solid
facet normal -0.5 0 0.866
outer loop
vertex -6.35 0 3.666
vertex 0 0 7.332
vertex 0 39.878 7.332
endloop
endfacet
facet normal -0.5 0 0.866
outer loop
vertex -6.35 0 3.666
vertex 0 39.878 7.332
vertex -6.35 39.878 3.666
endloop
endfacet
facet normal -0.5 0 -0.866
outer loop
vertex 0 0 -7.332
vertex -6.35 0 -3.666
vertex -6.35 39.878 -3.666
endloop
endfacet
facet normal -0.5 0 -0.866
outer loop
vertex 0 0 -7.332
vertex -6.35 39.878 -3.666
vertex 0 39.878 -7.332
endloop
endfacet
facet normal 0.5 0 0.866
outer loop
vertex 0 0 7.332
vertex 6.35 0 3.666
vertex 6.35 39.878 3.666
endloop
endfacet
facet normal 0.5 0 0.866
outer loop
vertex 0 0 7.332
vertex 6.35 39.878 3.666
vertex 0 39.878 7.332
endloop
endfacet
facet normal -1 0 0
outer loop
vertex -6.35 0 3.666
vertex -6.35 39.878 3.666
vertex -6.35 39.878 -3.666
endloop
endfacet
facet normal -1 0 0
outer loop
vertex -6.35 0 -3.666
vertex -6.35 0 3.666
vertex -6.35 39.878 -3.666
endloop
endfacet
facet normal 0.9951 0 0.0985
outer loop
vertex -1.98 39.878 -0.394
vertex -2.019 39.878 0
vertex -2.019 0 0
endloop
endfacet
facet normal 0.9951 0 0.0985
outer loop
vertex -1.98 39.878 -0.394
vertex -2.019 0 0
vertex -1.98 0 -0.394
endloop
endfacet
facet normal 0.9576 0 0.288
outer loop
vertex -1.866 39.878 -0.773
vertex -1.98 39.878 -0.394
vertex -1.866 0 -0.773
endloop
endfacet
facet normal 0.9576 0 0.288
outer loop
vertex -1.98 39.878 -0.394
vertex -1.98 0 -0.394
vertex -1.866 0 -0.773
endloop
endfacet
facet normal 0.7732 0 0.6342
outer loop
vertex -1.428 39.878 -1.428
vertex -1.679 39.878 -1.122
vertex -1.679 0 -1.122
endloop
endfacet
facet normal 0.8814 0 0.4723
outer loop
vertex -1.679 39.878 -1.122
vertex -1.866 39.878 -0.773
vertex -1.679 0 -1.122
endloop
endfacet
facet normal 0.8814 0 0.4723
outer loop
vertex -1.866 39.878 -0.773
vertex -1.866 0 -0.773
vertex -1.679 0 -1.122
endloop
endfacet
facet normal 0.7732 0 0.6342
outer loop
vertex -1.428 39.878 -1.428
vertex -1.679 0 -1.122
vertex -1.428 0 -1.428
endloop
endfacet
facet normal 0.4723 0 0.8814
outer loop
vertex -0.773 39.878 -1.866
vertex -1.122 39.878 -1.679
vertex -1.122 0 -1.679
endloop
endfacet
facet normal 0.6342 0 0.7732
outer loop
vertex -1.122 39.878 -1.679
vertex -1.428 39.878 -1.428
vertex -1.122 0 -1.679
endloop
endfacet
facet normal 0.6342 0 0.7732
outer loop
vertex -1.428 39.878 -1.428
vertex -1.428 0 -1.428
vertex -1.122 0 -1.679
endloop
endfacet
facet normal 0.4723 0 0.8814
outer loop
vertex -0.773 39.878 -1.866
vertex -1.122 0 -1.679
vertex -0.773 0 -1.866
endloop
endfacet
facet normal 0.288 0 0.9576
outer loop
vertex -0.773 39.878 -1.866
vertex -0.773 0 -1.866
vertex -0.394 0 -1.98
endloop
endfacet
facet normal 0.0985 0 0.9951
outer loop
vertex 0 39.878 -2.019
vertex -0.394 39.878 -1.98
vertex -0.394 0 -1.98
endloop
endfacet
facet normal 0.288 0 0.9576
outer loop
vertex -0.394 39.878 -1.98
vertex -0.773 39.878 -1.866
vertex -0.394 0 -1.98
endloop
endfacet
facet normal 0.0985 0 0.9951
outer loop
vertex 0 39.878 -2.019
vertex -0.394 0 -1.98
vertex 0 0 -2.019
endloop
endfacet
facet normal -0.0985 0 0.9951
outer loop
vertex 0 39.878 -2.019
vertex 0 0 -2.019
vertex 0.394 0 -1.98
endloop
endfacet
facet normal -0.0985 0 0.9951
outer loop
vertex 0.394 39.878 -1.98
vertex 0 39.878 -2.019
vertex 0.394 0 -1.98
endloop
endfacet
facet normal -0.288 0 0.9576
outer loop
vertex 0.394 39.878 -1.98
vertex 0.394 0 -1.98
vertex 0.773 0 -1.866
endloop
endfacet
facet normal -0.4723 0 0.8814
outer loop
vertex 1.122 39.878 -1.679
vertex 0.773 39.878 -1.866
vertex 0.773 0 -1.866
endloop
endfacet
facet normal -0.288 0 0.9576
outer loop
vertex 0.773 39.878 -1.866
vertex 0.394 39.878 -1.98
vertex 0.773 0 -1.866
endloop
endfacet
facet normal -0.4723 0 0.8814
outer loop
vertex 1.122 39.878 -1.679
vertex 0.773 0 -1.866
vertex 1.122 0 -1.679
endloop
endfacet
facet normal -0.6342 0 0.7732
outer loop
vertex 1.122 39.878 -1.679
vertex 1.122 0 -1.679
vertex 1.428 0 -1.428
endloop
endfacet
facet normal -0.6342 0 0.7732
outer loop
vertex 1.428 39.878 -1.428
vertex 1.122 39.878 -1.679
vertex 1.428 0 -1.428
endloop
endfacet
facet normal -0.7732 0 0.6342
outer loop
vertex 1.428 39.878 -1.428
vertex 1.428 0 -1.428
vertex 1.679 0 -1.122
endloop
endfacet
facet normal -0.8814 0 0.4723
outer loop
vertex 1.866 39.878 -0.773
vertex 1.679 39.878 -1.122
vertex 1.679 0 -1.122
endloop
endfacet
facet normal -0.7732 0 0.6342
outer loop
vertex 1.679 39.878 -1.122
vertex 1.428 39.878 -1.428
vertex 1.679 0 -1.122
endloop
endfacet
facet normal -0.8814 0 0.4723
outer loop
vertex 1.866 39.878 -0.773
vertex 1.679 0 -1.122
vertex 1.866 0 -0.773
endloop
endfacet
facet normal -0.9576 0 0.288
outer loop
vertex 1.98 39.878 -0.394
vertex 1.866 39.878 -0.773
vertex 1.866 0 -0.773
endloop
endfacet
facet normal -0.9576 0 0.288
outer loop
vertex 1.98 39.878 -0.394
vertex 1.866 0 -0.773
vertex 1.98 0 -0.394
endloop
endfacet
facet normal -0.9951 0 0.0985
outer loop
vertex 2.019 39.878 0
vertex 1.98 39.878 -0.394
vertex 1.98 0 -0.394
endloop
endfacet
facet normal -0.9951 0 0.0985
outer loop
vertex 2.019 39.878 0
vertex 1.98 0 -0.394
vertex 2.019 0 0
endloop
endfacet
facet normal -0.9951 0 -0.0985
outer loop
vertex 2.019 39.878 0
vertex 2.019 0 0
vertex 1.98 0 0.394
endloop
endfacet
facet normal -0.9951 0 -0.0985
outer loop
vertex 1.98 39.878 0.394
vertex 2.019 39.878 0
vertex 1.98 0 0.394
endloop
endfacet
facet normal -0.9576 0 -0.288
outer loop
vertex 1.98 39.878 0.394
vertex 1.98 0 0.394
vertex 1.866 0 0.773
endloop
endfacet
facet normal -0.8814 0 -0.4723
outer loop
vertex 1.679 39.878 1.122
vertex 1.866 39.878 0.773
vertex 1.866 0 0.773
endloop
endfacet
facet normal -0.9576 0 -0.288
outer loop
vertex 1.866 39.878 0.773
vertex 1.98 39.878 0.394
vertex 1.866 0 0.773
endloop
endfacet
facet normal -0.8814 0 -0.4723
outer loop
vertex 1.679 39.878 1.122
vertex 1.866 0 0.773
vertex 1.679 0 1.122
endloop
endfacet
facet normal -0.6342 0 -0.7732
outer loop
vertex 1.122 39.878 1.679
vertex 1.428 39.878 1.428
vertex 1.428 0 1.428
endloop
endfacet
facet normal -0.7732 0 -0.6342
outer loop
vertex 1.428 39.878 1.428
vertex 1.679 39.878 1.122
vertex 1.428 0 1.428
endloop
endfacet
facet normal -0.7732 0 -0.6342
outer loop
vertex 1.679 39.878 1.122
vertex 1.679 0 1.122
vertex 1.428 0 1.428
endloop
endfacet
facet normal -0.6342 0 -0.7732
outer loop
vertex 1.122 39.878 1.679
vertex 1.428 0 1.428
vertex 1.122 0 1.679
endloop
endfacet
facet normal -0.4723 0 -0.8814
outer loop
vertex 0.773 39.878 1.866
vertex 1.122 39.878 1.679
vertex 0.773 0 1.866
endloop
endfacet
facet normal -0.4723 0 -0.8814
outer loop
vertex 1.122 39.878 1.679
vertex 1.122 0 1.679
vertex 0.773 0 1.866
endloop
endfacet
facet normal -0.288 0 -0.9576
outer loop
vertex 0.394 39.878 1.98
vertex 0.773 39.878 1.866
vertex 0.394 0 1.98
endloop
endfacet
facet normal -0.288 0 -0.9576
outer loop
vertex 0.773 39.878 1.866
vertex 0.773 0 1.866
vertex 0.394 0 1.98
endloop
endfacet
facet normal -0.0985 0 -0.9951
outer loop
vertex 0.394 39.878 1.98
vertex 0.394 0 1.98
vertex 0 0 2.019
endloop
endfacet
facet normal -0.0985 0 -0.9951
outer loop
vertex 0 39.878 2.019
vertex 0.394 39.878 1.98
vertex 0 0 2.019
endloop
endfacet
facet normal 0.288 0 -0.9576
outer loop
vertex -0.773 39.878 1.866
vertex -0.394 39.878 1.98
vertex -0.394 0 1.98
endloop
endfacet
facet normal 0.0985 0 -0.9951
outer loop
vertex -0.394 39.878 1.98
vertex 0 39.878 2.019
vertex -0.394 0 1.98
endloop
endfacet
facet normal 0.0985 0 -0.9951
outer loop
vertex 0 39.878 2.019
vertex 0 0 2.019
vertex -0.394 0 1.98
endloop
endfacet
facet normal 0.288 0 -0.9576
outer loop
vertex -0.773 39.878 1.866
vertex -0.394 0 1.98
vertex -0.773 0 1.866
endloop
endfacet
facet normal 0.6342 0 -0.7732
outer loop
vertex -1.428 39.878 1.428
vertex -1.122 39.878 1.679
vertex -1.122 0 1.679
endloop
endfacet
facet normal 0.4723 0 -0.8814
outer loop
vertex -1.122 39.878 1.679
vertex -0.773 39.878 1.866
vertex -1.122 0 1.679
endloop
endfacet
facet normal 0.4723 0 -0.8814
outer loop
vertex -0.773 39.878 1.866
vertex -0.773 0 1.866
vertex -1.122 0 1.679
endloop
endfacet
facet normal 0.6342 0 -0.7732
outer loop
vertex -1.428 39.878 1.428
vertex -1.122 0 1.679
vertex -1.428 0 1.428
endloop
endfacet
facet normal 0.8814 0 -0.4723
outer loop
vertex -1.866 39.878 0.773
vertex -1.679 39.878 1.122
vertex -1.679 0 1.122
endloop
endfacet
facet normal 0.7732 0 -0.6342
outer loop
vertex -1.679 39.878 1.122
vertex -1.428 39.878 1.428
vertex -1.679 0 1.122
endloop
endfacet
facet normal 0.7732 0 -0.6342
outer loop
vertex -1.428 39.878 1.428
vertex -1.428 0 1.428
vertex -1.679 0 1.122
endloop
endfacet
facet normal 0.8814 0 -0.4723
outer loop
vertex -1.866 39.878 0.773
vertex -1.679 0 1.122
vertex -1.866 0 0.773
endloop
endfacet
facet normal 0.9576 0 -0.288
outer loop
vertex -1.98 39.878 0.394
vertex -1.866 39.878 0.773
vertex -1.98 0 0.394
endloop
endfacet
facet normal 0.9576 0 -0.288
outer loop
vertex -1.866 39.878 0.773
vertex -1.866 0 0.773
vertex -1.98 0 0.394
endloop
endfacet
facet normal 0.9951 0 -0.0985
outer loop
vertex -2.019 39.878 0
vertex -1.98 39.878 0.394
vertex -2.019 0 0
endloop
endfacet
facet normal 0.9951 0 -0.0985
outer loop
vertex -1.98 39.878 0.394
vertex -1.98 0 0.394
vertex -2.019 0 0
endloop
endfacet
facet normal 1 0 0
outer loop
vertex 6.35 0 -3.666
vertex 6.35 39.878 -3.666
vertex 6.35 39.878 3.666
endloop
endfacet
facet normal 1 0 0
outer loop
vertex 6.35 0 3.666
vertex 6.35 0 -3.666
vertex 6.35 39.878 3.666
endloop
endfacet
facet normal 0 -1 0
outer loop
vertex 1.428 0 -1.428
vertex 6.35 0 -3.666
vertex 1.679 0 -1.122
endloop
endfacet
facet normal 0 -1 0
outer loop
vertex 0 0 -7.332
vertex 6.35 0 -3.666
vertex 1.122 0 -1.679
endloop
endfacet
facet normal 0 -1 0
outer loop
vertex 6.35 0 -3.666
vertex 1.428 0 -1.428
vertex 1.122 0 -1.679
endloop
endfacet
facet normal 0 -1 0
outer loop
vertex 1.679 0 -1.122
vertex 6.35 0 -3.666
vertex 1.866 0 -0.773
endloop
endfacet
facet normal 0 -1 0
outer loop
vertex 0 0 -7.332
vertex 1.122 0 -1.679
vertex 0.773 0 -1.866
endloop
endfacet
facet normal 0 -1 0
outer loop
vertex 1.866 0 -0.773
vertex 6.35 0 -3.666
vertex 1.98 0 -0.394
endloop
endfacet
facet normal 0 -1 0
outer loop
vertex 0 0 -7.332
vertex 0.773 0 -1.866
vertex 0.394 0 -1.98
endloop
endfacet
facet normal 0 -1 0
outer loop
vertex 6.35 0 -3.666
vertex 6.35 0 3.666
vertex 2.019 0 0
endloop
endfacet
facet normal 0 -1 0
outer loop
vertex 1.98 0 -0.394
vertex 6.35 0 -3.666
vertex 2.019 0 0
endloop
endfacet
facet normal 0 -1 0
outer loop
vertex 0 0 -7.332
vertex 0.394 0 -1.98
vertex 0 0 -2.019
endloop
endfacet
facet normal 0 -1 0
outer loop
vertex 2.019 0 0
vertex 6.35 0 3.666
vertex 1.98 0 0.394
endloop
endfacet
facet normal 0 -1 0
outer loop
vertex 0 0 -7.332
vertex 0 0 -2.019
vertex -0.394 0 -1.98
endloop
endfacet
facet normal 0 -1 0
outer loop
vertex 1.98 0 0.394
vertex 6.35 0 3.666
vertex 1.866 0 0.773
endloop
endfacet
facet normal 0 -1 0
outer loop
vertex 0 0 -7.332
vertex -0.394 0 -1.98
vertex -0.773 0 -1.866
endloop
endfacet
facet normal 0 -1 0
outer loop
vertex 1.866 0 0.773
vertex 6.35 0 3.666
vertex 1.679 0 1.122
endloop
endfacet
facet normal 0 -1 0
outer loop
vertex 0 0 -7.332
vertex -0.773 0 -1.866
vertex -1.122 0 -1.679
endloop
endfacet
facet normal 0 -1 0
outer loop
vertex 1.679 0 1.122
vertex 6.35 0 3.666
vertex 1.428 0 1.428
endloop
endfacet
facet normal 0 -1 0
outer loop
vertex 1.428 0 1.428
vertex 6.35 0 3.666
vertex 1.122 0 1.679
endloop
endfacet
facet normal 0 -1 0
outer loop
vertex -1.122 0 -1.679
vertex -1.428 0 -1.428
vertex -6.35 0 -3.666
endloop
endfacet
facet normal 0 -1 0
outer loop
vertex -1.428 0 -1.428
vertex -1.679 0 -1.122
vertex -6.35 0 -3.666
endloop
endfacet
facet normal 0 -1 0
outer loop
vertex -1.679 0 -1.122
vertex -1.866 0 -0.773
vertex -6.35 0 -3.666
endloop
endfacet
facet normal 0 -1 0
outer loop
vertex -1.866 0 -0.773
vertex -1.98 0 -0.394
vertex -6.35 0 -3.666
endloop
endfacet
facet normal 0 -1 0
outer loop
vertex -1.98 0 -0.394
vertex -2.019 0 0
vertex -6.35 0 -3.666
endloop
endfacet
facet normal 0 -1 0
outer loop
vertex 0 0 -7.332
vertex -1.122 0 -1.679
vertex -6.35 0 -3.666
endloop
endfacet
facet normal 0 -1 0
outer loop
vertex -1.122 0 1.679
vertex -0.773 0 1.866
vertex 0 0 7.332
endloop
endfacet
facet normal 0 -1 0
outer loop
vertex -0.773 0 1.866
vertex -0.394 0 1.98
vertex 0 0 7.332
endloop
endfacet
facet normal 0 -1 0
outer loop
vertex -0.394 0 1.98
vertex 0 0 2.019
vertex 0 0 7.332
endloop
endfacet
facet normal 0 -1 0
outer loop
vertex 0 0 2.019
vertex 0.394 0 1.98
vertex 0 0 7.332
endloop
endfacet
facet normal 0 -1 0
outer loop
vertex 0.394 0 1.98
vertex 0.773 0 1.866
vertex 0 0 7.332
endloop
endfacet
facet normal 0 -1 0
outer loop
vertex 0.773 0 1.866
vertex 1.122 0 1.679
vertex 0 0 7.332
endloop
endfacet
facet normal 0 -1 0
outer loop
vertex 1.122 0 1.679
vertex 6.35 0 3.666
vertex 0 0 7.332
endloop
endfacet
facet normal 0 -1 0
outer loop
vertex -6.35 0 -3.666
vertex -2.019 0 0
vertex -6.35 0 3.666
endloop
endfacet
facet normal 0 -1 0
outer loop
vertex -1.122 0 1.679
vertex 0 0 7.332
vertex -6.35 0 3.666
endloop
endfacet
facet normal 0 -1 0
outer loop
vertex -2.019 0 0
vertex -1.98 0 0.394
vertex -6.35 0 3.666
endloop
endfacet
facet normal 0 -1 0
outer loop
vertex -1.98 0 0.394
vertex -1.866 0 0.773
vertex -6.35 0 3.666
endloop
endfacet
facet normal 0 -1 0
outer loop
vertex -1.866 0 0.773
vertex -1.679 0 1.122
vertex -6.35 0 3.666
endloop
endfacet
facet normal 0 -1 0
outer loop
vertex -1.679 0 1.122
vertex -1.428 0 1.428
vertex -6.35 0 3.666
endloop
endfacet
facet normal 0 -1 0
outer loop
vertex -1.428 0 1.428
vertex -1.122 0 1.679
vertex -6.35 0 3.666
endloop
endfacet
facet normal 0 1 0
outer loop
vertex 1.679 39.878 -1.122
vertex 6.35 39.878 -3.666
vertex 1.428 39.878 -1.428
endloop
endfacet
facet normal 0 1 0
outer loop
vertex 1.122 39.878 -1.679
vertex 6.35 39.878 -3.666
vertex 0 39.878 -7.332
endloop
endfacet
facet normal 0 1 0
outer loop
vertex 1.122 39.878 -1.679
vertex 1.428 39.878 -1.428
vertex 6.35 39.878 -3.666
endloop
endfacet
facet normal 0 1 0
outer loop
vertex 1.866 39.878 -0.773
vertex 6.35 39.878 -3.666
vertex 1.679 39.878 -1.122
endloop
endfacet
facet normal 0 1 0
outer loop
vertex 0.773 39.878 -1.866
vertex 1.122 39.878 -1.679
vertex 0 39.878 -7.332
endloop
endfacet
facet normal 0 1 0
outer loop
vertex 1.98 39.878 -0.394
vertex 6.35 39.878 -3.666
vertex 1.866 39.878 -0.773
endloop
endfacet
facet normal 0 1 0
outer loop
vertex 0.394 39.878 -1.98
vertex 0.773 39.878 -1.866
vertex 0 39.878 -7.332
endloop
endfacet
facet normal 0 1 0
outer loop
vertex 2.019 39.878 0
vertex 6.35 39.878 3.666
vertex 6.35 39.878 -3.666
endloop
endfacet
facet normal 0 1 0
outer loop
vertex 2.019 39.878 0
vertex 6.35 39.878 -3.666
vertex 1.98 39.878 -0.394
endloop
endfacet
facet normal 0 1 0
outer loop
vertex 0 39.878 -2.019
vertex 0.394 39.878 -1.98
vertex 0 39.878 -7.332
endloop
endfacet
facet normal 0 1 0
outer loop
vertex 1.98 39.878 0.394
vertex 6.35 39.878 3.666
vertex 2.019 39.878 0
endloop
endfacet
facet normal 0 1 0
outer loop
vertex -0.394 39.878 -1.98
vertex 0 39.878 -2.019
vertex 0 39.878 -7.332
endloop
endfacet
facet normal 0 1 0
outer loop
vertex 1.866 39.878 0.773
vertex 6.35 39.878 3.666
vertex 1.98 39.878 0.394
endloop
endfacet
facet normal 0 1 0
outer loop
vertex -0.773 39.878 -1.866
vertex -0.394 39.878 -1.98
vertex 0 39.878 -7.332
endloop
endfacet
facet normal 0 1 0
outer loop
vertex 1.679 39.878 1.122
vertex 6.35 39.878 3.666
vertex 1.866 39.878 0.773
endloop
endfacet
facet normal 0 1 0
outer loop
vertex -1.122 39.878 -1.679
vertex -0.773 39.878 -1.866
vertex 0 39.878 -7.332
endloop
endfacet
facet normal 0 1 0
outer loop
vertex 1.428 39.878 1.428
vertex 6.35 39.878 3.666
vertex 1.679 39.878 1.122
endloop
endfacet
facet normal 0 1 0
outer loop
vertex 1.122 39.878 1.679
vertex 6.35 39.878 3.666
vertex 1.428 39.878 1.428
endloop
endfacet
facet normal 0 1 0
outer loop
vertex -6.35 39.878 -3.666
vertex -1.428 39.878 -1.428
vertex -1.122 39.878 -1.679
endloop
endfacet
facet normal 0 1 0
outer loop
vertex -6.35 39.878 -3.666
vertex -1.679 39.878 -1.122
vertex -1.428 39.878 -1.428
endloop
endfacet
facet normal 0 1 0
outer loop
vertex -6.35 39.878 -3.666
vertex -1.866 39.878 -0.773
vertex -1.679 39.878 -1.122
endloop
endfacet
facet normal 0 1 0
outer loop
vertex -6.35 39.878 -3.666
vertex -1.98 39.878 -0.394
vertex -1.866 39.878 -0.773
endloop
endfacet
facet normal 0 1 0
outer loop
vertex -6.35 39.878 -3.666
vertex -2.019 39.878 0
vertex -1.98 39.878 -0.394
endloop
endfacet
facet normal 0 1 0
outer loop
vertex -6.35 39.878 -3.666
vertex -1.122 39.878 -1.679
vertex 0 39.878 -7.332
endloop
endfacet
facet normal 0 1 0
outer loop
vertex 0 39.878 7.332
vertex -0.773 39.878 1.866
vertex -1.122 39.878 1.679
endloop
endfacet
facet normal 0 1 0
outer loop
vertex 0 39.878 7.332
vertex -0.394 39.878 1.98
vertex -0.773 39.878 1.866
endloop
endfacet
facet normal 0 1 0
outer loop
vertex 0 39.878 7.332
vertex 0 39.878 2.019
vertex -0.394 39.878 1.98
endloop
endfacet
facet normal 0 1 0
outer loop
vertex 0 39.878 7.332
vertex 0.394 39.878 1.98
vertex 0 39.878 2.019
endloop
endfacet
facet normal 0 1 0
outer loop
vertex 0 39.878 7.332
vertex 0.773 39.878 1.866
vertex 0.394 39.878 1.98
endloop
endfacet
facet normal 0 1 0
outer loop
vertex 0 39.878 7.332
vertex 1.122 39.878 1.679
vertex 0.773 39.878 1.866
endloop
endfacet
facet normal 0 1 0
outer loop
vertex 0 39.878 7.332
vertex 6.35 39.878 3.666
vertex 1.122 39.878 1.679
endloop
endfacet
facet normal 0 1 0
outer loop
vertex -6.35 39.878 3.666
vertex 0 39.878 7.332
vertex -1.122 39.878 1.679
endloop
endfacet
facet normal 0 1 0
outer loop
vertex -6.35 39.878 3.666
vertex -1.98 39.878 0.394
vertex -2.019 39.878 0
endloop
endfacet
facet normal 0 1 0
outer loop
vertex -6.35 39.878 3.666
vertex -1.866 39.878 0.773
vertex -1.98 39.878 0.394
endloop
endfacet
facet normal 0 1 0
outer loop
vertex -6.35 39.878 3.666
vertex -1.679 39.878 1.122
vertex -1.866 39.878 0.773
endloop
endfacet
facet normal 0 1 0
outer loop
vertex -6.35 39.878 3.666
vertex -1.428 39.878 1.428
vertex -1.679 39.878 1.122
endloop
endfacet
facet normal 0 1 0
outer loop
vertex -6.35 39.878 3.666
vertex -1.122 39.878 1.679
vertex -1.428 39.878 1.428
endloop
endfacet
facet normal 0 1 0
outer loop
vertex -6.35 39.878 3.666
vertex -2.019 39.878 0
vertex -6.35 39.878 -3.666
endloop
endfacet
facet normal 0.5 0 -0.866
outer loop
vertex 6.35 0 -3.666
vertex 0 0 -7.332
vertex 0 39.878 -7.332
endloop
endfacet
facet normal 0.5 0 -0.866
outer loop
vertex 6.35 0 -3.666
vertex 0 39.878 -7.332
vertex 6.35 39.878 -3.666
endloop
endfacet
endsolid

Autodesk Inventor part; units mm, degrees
ref_plane "YZ Plane" through (0, 0, 0) normal (1, 0, 0) x (0, 1, 0)
ref_plane "XZ Plane" through (0, 0, 0) normal (0, 1, 0) x (-1, 0, 0)
ref_plane "XY Plane" through (0, 0, 0) normal (0, 0, 1) x (1, 0, 0)
sketch "Sketch1" plane through (0, 0, 0) normal (0, 1, 0) x (-1, 0, 0)
  line L0 (0, -7.3323) -> (-6.35, -3.6662)
  line L1 (-6.35, -3.6662) -> (-6.35, 3.6662)
  line L2 (-6.35, 3.6662) -> (0, 7.3323)
  line L3 (0, 7.3323) -> (6.35, 3.6662)
  line L4 (6.35, 3.6662) -> (6.35, -3.6662)
  line L5 (6.35, -3.6662) -> (0, -7.3323)
  circle A0 centre (0, 0) radius 2.0193
  point P0 (-3.175, 5.4993)
  point P1 (6.35, 0)
  dimension "d0" = 12.7
  dimension "d1" = 4.0386
extrude "Extrusion1" add sketch "Sketch1" along normal blind 39.878
thread "Thread1" size "10-32 UNF" class "2B" standard "ANSI Unified Screw Threads" full length
properties part number "Gearbox4_003_Hexshaft"
